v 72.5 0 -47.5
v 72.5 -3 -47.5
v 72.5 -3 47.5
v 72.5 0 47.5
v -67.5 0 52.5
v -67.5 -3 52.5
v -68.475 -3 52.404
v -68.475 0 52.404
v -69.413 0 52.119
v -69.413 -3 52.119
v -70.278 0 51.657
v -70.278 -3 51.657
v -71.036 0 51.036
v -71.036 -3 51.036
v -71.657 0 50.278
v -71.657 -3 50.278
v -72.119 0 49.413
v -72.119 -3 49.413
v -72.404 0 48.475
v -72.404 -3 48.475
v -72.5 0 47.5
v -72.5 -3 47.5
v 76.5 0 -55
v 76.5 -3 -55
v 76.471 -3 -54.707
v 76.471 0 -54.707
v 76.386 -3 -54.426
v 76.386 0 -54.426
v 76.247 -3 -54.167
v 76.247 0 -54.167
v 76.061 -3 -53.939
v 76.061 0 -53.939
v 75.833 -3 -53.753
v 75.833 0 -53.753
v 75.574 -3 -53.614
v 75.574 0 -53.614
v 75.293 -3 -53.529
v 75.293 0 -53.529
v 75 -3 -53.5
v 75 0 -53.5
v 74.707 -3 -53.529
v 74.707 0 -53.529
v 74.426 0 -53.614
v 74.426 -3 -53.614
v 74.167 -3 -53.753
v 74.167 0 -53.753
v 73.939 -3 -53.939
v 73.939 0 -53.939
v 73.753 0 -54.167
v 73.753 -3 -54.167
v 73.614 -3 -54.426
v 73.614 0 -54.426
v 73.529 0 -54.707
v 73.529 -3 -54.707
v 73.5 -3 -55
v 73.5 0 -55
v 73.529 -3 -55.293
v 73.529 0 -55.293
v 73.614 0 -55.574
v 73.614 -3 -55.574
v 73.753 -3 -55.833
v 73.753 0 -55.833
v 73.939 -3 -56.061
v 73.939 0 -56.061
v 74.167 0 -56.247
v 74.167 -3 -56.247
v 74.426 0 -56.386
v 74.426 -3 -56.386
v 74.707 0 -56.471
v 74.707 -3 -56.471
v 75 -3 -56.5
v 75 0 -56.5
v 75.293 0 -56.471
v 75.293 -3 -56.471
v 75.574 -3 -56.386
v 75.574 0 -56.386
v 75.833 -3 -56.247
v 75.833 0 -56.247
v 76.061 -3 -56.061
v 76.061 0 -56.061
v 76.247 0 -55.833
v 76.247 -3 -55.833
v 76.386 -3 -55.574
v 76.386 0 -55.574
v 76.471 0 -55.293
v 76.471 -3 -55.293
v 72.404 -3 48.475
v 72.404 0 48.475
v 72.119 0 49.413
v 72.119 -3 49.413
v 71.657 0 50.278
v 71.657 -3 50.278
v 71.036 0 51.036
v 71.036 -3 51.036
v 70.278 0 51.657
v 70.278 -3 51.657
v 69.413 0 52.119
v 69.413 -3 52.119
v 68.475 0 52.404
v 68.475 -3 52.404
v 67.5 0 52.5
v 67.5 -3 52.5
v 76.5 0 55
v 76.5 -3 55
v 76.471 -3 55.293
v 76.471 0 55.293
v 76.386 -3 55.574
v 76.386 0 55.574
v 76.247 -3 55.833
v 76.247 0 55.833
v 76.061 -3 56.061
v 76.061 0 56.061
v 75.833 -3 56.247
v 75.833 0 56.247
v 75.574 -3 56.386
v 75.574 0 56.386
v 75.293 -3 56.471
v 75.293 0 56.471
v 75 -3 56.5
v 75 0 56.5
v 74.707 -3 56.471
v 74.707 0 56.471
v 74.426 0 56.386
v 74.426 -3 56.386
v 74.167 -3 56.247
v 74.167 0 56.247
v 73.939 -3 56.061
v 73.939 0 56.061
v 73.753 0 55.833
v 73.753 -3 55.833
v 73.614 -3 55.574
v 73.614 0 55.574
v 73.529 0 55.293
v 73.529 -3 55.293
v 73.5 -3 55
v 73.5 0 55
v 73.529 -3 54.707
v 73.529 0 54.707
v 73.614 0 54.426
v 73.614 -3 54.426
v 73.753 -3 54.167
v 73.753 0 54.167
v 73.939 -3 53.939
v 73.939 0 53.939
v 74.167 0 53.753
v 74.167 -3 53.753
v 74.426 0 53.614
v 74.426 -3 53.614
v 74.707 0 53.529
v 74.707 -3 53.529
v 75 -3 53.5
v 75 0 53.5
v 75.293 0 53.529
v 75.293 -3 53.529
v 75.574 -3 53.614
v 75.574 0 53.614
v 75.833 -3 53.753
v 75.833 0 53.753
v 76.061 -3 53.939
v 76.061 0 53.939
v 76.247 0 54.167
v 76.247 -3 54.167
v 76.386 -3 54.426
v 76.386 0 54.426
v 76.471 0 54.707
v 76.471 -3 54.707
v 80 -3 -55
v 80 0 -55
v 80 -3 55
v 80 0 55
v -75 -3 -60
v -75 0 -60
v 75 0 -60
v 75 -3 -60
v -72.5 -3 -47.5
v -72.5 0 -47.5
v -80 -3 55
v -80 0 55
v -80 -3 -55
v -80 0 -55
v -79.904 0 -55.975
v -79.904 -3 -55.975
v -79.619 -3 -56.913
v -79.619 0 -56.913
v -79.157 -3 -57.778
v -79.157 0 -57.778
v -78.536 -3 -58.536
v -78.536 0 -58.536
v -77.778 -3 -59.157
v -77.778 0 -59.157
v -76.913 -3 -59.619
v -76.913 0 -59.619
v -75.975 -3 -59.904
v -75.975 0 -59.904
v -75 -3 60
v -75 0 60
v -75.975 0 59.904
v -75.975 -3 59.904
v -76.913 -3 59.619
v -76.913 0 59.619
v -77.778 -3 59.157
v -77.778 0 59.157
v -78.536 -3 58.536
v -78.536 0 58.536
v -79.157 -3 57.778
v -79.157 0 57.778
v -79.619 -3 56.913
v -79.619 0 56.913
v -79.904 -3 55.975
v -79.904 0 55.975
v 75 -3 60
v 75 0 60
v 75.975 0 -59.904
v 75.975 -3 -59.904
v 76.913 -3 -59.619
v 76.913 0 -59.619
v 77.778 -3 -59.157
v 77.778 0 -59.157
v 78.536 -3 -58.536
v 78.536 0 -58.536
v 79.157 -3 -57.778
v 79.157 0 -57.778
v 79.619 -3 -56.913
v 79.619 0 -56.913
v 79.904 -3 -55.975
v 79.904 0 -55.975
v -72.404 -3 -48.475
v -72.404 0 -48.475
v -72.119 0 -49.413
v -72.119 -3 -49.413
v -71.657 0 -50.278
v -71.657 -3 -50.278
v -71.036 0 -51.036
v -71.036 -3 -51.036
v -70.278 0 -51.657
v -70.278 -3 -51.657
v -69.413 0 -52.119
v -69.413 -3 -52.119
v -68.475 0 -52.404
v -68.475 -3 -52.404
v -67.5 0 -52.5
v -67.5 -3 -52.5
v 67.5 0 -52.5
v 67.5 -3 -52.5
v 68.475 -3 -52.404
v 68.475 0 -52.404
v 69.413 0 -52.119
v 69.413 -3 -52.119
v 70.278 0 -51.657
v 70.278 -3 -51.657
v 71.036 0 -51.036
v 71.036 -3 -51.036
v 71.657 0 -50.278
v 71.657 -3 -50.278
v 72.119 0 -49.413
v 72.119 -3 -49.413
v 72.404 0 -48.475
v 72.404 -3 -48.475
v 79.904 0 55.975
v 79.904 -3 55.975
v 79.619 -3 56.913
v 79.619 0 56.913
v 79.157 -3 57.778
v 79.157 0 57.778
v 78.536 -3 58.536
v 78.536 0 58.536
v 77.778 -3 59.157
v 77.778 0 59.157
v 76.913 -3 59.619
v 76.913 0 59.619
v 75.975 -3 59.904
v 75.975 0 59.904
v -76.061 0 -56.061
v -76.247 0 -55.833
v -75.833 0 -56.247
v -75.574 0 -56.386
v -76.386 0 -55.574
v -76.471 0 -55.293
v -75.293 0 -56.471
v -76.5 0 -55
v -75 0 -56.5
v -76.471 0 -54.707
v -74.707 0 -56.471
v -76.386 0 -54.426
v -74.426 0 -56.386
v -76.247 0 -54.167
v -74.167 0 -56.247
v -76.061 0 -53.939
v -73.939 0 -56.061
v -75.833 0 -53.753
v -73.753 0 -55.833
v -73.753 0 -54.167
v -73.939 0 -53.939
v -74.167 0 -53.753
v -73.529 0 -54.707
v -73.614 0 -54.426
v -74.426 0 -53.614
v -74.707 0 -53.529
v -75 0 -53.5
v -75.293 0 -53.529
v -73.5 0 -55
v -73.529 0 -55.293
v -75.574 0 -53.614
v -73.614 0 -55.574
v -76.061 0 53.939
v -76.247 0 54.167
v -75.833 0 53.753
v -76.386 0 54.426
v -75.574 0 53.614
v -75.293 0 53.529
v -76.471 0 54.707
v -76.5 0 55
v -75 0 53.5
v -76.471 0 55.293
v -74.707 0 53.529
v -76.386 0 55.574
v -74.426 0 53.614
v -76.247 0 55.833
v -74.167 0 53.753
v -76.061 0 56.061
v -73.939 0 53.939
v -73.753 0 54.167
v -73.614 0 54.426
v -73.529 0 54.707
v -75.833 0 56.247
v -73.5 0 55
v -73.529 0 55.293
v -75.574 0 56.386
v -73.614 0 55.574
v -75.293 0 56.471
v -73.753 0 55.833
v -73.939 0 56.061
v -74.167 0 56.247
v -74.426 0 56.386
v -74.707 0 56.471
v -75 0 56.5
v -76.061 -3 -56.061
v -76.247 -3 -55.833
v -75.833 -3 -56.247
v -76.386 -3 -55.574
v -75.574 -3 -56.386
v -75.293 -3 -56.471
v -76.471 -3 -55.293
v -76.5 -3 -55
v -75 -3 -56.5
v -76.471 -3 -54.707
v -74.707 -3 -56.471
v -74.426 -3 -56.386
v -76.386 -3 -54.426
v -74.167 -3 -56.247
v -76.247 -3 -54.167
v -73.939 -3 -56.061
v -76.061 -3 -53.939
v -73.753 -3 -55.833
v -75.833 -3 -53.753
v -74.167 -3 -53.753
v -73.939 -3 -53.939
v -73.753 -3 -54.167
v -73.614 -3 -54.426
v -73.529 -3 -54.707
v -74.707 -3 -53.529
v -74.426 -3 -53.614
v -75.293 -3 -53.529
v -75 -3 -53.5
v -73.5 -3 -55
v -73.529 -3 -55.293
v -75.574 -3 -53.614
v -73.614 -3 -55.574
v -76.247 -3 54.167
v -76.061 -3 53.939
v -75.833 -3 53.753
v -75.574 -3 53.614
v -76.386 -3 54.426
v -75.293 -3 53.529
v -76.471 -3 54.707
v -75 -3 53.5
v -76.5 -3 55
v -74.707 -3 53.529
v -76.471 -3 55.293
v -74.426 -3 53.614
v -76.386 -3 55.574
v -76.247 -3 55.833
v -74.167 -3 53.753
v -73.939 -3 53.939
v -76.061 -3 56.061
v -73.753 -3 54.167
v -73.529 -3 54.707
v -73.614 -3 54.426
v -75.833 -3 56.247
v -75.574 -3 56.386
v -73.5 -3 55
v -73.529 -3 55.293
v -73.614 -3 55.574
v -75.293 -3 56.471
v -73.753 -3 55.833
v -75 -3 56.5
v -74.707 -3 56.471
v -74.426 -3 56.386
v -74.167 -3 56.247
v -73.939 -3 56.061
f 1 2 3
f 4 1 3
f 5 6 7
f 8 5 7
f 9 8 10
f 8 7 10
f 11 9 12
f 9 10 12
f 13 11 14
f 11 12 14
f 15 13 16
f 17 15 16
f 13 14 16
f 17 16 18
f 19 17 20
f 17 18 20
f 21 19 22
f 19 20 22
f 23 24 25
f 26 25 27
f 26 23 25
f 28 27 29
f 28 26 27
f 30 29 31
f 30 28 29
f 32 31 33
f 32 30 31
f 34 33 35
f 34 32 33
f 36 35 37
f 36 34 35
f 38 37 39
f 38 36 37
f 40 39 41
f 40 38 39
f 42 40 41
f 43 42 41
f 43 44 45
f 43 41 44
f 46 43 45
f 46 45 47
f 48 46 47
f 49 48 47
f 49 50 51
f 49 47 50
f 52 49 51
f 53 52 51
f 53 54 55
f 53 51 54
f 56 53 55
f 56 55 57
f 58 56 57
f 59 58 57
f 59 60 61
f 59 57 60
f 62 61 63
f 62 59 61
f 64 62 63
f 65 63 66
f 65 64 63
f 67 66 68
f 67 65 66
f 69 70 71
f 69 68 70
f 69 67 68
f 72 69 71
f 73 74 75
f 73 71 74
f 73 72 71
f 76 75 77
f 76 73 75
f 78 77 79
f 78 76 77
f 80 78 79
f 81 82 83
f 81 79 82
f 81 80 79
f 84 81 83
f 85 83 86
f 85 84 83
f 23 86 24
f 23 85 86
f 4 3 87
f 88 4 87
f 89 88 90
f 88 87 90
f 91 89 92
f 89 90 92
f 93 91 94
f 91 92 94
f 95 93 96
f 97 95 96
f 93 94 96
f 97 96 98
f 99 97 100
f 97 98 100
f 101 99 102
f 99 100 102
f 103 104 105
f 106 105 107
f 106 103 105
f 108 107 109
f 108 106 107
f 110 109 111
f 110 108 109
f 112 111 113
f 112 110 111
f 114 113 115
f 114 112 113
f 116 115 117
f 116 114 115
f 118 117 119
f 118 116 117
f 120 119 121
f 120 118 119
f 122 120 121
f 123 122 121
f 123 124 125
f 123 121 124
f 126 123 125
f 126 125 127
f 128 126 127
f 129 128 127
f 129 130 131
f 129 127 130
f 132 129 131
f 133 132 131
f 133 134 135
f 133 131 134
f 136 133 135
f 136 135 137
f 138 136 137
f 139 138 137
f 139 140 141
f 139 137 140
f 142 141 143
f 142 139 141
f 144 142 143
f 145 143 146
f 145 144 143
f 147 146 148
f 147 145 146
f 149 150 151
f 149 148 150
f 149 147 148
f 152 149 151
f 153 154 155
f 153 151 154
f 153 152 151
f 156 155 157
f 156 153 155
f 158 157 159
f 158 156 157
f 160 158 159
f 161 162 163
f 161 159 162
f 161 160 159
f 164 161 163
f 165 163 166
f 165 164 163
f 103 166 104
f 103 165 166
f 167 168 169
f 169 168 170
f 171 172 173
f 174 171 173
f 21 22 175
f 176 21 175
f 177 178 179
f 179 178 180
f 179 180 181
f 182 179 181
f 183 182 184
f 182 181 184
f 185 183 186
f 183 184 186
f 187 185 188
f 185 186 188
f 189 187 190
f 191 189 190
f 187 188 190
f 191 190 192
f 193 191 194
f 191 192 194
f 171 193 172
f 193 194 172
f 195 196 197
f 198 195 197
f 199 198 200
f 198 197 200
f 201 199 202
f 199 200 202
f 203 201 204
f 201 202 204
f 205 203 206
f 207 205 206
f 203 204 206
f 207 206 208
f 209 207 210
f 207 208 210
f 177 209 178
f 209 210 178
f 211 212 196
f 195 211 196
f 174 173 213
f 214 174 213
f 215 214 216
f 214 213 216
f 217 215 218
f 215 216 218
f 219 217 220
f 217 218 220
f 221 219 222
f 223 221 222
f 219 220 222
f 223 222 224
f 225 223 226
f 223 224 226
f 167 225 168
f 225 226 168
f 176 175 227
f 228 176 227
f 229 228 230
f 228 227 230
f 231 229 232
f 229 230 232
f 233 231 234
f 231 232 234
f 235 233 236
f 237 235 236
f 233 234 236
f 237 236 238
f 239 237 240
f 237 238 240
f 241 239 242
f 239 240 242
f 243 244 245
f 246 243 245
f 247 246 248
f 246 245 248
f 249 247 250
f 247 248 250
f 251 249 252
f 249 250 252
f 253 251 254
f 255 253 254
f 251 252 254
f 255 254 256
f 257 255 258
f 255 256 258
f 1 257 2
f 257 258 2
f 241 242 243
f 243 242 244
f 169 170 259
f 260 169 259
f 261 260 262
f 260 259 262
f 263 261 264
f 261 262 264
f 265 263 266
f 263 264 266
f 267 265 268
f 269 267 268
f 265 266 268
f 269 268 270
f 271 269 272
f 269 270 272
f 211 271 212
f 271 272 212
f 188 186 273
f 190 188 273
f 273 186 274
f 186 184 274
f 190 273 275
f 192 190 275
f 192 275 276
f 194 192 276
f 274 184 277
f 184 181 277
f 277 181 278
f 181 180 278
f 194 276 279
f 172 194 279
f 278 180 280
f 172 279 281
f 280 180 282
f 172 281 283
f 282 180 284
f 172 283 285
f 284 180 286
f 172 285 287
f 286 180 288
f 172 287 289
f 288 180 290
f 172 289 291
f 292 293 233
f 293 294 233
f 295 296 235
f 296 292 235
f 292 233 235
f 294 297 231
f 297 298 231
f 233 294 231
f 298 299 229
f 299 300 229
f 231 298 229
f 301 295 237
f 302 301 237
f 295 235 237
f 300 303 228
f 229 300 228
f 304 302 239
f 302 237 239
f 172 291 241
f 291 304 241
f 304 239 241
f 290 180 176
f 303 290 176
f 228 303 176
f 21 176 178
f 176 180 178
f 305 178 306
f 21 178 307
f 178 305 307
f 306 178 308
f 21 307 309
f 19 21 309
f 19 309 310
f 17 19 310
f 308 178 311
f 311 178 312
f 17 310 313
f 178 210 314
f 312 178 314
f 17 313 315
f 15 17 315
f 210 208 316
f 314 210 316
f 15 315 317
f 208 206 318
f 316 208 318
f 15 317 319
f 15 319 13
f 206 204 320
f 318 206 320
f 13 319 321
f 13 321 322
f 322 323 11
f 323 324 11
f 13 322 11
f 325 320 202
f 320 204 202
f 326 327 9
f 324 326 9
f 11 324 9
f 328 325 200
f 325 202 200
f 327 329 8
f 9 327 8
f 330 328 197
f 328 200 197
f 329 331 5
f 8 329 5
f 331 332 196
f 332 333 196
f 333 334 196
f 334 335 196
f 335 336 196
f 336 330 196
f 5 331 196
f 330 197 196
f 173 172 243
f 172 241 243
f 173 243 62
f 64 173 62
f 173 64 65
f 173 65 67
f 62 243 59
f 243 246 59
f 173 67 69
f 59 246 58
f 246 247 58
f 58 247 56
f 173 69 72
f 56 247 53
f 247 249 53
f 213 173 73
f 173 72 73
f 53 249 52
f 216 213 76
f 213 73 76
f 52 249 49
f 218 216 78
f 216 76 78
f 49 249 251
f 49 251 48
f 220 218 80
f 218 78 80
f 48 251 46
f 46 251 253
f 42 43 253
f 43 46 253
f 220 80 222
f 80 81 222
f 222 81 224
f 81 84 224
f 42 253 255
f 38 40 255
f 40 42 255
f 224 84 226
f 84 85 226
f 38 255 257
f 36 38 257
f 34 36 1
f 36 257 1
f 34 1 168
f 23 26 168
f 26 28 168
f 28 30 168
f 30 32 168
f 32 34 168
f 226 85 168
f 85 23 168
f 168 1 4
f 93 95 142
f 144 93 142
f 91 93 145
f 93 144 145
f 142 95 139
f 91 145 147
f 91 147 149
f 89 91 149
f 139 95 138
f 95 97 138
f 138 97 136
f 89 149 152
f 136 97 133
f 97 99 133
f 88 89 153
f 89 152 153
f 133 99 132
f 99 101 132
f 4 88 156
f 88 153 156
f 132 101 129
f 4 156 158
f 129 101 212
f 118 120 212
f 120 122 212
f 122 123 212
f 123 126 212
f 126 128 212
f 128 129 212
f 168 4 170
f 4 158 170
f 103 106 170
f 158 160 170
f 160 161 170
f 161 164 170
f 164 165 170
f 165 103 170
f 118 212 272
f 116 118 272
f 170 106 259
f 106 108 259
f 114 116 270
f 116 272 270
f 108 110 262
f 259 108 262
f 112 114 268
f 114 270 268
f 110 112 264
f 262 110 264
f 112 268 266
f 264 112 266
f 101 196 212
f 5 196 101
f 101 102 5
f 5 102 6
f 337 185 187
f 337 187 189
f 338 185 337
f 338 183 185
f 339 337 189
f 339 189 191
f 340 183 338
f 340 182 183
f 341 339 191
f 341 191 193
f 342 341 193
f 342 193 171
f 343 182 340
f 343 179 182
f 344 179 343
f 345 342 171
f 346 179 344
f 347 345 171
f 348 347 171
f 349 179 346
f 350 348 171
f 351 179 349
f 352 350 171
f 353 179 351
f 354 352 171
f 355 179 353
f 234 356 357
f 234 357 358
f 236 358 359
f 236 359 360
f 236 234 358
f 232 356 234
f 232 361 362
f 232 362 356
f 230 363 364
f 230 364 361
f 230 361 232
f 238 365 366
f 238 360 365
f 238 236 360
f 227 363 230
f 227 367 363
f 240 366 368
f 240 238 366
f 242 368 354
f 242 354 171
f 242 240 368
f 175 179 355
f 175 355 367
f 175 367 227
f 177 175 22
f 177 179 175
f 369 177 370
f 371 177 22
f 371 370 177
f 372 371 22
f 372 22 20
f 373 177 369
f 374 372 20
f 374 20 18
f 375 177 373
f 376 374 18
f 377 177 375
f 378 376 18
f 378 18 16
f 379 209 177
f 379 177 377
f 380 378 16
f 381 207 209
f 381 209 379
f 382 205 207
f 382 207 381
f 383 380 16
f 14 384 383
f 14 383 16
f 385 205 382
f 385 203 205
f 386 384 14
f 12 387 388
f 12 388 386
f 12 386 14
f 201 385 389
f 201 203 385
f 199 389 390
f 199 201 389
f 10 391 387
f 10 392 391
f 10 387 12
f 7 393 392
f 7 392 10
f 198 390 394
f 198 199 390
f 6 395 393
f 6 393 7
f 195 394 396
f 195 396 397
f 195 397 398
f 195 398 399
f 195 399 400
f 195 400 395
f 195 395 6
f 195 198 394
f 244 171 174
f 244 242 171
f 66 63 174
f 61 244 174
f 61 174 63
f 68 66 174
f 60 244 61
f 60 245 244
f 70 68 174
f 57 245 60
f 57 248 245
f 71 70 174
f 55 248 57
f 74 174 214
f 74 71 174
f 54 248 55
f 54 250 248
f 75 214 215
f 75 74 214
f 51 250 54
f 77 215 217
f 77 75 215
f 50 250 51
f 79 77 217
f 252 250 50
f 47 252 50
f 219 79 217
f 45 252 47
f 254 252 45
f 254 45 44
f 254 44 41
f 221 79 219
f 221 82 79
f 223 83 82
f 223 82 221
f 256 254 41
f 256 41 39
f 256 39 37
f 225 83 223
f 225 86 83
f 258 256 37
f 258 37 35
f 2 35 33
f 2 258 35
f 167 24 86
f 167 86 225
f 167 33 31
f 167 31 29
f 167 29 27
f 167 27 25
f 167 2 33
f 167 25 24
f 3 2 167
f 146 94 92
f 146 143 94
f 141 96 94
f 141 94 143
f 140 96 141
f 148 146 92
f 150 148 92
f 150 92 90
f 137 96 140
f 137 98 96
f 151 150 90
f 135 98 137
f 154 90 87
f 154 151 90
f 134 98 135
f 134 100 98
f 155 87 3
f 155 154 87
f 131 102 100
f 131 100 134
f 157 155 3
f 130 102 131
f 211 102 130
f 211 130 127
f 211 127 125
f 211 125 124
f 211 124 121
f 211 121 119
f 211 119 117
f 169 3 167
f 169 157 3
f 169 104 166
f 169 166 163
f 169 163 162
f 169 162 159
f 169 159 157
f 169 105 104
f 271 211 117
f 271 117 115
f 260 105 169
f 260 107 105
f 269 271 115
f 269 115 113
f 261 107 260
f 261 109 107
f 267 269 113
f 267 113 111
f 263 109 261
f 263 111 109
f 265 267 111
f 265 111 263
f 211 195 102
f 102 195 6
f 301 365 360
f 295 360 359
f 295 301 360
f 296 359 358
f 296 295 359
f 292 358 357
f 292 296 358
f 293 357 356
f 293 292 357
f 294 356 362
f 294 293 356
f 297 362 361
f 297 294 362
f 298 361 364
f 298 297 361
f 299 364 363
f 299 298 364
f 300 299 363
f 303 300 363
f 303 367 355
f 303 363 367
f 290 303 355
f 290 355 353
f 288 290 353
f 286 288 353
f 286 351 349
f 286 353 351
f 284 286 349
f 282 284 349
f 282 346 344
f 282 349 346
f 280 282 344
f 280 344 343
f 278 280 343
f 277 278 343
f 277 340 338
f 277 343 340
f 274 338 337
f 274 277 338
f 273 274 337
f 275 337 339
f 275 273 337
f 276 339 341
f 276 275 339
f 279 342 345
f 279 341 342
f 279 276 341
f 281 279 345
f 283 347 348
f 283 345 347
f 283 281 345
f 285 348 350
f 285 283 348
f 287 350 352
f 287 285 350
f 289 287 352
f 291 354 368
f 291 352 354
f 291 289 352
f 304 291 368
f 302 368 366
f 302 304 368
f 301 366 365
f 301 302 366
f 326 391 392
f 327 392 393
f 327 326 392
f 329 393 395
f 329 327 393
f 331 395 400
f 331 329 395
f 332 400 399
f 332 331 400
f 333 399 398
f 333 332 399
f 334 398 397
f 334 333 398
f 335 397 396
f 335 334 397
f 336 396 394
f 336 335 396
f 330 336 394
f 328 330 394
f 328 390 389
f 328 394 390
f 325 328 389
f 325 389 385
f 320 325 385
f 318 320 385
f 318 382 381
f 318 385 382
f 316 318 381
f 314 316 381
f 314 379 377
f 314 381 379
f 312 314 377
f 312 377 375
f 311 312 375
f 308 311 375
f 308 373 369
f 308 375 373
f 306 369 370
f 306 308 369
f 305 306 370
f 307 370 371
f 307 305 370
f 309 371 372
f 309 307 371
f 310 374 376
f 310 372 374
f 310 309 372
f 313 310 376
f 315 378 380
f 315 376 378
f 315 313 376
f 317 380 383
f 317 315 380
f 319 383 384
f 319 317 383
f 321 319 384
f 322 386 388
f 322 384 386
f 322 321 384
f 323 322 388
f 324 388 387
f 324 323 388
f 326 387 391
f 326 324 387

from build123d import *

# Parameters (mm, degrees)
F1_DEPTH = 3
F2_R     = 1.5
F3_DEPTH = 25
F5_DEPTH = 3


with BuildPart() as f1:
    # F0 (on Front) → F1 (new body)
    with BuildSketch(Plane.XZ):
        with BuildLine():
            Line((-75, -60), (75, -60))
            ThreePointArc((75, -60), (78.535534, -58.535534), (80, -55))
            Line((80, -55), (80, 55))
            ThreePointArc((80, 55), (78.535534, 58.535534), (75, 60))
            Line((75, 60), (-75, 60))
            ThreePointArc((-75, 60), (-78.535534, 58.535534), (-80, 55))
            Line((-80, 55), (-80, -55))
            ThreePointArc((-80, -55), (-78.535534, -58.535534), (-75, -60))
        make_face()
    extrude(amount=F1_DEPTH)

    # F2 (on Front) → F3 (cut)
    with BuildSketch(Plane.XZ):
        with Locations((-75, 55)):
            Circle(F2_R)
        with Locations((75, 55)):
            Circle(F2_R)
        with Locations((75, -55)):
            Circle(F2_R)
        with Locations((-75, -55)):
            Circle(F2_R)
    extrude(amount=F3_DEPTH, mode=Mode.SUBTRACT)

    # F4 (on face) → F5 (cut)
    with BuildSketch(Plane.XZ.offset(3)):
        with BuildLine():
            ThreePointArc((72.5, 47.5), (71.035534, 51.035534), (67.5, 52.5))
            Line((67.5, 52.5), (-67.5, 52.5))
            ThreePointArc((-67.5, 52.5), (-71.035534, 51.035534), (-72.5, 47.5))
            Line((-72.5, 47.5), (-72.5, -47.5))
            ThreePointArc((-72.5, -47.5), (-71.035534, -51.035534), (-67.5, -52.5))
            Line((-67.5, -52.5), (67.5, -52.5))
            ThreePointArc((67.5, -52.5), (71.035534, -51.035534), (72.5, -47.5))
            Line((72.5, -47.5), (72.5, 47.5))
        make_face()
    extrude(amount=-F5_DEPTH, mode=Mode.SUBTRACT)


solid = f1.part
